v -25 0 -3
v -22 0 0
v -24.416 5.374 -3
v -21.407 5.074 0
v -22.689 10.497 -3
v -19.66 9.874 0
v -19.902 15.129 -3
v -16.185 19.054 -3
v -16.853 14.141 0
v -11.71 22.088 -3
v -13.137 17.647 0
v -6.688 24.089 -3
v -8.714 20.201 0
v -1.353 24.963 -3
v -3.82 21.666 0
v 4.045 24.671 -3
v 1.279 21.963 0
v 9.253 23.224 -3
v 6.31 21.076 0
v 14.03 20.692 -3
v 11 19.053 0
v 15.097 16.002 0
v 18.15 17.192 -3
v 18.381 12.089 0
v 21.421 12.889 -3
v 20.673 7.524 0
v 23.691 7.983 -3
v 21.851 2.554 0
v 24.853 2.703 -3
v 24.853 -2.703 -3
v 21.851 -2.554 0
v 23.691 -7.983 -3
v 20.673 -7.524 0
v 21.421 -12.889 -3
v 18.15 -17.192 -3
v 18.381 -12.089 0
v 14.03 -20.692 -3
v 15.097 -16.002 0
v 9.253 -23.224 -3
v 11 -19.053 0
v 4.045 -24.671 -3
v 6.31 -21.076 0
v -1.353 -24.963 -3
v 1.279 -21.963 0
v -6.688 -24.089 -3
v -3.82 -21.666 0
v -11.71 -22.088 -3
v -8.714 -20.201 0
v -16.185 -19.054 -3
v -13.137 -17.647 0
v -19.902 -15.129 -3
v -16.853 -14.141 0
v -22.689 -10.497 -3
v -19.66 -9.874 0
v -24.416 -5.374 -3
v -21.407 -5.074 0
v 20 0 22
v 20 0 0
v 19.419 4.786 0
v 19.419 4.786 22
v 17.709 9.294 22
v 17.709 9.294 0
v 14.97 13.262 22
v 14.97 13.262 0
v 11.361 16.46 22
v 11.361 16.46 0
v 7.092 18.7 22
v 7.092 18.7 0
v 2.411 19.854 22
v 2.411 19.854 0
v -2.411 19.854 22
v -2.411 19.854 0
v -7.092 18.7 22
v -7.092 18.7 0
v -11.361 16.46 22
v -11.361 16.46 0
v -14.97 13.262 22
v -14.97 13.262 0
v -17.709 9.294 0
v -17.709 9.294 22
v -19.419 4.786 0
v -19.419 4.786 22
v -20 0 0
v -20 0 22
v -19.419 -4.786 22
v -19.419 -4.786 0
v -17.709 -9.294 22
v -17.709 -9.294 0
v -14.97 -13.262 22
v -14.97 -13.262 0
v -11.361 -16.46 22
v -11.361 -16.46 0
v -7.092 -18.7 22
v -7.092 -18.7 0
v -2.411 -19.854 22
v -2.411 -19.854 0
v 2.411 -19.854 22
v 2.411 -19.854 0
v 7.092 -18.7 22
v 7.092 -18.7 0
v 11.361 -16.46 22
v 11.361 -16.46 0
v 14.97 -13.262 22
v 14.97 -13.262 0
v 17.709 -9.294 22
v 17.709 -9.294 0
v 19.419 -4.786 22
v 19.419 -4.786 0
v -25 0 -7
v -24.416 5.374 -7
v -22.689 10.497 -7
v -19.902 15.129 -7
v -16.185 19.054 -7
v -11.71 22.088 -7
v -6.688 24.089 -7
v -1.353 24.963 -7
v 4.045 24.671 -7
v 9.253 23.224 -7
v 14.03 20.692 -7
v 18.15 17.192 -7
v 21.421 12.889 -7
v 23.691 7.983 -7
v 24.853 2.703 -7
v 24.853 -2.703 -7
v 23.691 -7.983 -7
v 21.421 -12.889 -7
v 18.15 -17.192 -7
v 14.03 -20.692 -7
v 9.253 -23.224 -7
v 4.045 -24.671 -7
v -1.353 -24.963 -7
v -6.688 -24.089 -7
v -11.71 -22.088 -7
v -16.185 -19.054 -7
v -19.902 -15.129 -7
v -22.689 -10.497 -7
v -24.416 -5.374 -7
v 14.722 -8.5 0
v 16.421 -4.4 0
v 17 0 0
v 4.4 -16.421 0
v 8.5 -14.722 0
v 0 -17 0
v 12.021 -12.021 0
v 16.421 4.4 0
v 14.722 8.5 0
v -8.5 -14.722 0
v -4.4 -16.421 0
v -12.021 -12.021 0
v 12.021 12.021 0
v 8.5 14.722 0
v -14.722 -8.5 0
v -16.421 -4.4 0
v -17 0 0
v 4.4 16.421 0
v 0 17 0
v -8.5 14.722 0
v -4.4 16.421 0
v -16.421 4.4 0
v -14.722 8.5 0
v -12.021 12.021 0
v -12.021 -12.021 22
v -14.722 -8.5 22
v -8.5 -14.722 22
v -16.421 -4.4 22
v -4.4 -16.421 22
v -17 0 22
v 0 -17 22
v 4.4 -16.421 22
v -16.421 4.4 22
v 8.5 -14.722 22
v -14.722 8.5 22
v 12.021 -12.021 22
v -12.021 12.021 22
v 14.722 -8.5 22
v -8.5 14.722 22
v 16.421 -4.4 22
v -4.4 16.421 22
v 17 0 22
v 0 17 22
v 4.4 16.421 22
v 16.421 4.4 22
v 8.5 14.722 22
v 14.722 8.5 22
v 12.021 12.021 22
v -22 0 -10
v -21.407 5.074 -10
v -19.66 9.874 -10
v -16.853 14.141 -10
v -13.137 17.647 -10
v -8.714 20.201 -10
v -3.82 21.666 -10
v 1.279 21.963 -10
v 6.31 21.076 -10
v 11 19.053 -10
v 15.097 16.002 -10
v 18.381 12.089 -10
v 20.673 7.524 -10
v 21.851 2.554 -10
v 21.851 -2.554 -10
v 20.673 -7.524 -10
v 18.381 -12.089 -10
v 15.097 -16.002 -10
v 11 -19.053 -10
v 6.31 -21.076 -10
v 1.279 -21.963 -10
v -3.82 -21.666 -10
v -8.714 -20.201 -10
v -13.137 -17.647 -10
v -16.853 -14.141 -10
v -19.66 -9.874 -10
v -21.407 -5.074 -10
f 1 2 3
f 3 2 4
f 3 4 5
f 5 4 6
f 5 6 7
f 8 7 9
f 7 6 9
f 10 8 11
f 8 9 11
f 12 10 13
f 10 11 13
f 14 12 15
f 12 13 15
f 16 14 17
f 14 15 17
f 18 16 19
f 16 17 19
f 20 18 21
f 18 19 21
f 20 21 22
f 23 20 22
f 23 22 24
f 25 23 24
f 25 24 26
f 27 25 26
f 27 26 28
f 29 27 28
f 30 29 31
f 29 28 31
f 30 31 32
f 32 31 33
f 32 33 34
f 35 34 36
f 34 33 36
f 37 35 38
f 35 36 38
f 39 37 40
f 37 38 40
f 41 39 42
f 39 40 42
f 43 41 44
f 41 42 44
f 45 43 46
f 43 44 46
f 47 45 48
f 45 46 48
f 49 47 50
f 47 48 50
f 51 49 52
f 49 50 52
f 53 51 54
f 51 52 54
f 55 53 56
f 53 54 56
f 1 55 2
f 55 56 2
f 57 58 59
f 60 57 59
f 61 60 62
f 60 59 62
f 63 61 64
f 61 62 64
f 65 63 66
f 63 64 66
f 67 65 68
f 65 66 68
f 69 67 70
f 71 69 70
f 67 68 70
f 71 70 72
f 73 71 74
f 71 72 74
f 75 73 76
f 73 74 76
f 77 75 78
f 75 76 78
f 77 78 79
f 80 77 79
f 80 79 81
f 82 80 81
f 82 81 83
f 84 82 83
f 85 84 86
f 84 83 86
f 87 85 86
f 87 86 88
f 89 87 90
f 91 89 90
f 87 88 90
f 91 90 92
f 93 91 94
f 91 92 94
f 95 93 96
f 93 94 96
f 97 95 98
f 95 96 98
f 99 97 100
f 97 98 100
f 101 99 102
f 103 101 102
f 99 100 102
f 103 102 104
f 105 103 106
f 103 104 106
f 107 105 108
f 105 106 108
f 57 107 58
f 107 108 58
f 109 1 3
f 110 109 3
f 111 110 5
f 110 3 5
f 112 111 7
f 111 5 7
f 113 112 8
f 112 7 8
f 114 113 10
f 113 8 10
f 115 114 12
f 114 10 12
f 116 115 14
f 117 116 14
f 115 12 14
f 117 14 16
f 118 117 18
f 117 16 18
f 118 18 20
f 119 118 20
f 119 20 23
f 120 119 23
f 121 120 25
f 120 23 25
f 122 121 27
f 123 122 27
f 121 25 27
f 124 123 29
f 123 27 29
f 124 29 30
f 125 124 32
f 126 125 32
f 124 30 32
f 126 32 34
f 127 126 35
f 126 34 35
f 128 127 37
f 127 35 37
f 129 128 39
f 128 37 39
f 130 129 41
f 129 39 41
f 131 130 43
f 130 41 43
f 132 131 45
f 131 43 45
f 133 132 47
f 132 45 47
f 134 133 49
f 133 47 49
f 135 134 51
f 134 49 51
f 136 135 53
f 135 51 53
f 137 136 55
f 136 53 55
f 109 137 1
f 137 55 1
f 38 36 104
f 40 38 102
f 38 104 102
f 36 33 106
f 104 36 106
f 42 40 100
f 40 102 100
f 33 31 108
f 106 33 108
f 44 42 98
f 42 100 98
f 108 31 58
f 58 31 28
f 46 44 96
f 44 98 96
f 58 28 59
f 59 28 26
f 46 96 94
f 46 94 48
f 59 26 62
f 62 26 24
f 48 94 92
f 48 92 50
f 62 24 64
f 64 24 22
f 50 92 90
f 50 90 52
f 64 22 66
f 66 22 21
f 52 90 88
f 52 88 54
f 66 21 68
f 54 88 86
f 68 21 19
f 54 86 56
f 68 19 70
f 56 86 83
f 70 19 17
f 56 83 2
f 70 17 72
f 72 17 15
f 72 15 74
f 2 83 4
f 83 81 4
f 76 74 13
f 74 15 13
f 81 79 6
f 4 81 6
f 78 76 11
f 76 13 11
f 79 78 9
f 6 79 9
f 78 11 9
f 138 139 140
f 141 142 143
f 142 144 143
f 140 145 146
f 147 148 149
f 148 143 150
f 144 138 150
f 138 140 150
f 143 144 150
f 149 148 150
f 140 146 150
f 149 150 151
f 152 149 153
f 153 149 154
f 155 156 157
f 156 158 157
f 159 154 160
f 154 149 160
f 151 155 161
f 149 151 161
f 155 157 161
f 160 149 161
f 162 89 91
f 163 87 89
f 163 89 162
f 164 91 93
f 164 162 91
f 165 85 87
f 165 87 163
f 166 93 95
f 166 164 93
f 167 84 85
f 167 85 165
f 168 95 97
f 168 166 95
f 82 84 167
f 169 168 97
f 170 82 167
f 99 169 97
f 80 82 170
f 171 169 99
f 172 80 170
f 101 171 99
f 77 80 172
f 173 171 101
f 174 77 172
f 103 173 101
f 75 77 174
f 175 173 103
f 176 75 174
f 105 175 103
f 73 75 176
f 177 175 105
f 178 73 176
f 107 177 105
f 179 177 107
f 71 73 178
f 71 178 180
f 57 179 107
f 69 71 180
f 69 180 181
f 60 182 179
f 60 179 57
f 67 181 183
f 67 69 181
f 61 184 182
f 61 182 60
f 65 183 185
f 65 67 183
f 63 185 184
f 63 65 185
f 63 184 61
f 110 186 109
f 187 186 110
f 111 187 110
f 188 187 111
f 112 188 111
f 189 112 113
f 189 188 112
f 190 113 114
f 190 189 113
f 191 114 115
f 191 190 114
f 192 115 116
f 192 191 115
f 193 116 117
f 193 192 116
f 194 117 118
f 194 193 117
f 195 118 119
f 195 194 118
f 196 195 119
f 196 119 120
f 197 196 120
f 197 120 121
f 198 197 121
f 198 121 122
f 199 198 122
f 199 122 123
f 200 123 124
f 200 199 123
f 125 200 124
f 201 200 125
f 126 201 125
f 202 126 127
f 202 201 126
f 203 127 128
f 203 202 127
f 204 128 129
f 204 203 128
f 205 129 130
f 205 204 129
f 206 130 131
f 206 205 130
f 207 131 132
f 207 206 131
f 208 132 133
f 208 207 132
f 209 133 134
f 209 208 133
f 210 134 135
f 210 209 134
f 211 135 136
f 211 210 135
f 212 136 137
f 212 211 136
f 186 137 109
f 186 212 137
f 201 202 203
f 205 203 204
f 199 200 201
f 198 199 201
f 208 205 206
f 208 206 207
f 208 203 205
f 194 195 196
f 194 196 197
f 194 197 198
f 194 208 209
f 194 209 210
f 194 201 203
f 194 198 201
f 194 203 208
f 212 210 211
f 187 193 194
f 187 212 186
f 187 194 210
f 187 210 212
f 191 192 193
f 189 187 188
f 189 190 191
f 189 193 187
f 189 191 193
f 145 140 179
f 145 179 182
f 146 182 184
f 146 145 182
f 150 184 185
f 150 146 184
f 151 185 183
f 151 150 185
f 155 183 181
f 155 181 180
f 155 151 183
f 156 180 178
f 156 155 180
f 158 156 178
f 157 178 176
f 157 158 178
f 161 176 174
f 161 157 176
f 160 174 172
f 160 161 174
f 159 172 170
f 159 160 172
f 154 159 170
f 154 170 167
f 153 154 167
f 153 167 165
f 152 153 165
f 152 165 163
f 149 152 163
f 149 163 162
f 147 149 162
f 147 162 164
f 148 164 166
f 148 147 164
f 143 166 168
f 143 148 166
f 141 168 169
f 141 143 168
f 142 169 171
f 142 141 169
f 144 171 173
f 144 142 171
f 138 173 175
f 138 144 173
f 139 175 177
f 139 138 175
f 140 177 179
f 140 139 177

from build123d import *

# Parameters (mm, degrees)
SKETCH_1_R      = 20
SKETCH_1_R_2    = 17
EXTRUDE_1_DEPTH = 22
SKETCH_2_R      = 25
EXTRUDE_2_DEPTH = 10
CHAMFER_1_SIZE  = 3


with BuildPart() as part:
    # 草图1 → 凸台-拉伸1 (new body)
    with BuildSketch(Plane.XY):
        Circle(SKETCH_1_R)
        Circle(SKETCH_1_R_2, mode=Mode.SUBTRACT)
    extrude(amount=EXTRUDE_1_DEPTH)

    # 草图2 → 凸台-拉伸2 (add)
    with BuildSketch(Plane(origin=(0, 0, 0), x_dir=(-1, 0, 0), z_dir=(0, 0, -1))):
        Circle(SKETCH_2_R)
    extrude(amount=EXTRUDE_2_DEPTH)

    # 倒角1
    chamfer_1_edges = [part.edges().sort_by_distance(p)[0] for p in [
        (25, 0, 0),
        (25, 0, -10),
    ]]
    chamfer(chamfer_1_edges, length=CHAMFER_1_SIZE)


solid = part.part
